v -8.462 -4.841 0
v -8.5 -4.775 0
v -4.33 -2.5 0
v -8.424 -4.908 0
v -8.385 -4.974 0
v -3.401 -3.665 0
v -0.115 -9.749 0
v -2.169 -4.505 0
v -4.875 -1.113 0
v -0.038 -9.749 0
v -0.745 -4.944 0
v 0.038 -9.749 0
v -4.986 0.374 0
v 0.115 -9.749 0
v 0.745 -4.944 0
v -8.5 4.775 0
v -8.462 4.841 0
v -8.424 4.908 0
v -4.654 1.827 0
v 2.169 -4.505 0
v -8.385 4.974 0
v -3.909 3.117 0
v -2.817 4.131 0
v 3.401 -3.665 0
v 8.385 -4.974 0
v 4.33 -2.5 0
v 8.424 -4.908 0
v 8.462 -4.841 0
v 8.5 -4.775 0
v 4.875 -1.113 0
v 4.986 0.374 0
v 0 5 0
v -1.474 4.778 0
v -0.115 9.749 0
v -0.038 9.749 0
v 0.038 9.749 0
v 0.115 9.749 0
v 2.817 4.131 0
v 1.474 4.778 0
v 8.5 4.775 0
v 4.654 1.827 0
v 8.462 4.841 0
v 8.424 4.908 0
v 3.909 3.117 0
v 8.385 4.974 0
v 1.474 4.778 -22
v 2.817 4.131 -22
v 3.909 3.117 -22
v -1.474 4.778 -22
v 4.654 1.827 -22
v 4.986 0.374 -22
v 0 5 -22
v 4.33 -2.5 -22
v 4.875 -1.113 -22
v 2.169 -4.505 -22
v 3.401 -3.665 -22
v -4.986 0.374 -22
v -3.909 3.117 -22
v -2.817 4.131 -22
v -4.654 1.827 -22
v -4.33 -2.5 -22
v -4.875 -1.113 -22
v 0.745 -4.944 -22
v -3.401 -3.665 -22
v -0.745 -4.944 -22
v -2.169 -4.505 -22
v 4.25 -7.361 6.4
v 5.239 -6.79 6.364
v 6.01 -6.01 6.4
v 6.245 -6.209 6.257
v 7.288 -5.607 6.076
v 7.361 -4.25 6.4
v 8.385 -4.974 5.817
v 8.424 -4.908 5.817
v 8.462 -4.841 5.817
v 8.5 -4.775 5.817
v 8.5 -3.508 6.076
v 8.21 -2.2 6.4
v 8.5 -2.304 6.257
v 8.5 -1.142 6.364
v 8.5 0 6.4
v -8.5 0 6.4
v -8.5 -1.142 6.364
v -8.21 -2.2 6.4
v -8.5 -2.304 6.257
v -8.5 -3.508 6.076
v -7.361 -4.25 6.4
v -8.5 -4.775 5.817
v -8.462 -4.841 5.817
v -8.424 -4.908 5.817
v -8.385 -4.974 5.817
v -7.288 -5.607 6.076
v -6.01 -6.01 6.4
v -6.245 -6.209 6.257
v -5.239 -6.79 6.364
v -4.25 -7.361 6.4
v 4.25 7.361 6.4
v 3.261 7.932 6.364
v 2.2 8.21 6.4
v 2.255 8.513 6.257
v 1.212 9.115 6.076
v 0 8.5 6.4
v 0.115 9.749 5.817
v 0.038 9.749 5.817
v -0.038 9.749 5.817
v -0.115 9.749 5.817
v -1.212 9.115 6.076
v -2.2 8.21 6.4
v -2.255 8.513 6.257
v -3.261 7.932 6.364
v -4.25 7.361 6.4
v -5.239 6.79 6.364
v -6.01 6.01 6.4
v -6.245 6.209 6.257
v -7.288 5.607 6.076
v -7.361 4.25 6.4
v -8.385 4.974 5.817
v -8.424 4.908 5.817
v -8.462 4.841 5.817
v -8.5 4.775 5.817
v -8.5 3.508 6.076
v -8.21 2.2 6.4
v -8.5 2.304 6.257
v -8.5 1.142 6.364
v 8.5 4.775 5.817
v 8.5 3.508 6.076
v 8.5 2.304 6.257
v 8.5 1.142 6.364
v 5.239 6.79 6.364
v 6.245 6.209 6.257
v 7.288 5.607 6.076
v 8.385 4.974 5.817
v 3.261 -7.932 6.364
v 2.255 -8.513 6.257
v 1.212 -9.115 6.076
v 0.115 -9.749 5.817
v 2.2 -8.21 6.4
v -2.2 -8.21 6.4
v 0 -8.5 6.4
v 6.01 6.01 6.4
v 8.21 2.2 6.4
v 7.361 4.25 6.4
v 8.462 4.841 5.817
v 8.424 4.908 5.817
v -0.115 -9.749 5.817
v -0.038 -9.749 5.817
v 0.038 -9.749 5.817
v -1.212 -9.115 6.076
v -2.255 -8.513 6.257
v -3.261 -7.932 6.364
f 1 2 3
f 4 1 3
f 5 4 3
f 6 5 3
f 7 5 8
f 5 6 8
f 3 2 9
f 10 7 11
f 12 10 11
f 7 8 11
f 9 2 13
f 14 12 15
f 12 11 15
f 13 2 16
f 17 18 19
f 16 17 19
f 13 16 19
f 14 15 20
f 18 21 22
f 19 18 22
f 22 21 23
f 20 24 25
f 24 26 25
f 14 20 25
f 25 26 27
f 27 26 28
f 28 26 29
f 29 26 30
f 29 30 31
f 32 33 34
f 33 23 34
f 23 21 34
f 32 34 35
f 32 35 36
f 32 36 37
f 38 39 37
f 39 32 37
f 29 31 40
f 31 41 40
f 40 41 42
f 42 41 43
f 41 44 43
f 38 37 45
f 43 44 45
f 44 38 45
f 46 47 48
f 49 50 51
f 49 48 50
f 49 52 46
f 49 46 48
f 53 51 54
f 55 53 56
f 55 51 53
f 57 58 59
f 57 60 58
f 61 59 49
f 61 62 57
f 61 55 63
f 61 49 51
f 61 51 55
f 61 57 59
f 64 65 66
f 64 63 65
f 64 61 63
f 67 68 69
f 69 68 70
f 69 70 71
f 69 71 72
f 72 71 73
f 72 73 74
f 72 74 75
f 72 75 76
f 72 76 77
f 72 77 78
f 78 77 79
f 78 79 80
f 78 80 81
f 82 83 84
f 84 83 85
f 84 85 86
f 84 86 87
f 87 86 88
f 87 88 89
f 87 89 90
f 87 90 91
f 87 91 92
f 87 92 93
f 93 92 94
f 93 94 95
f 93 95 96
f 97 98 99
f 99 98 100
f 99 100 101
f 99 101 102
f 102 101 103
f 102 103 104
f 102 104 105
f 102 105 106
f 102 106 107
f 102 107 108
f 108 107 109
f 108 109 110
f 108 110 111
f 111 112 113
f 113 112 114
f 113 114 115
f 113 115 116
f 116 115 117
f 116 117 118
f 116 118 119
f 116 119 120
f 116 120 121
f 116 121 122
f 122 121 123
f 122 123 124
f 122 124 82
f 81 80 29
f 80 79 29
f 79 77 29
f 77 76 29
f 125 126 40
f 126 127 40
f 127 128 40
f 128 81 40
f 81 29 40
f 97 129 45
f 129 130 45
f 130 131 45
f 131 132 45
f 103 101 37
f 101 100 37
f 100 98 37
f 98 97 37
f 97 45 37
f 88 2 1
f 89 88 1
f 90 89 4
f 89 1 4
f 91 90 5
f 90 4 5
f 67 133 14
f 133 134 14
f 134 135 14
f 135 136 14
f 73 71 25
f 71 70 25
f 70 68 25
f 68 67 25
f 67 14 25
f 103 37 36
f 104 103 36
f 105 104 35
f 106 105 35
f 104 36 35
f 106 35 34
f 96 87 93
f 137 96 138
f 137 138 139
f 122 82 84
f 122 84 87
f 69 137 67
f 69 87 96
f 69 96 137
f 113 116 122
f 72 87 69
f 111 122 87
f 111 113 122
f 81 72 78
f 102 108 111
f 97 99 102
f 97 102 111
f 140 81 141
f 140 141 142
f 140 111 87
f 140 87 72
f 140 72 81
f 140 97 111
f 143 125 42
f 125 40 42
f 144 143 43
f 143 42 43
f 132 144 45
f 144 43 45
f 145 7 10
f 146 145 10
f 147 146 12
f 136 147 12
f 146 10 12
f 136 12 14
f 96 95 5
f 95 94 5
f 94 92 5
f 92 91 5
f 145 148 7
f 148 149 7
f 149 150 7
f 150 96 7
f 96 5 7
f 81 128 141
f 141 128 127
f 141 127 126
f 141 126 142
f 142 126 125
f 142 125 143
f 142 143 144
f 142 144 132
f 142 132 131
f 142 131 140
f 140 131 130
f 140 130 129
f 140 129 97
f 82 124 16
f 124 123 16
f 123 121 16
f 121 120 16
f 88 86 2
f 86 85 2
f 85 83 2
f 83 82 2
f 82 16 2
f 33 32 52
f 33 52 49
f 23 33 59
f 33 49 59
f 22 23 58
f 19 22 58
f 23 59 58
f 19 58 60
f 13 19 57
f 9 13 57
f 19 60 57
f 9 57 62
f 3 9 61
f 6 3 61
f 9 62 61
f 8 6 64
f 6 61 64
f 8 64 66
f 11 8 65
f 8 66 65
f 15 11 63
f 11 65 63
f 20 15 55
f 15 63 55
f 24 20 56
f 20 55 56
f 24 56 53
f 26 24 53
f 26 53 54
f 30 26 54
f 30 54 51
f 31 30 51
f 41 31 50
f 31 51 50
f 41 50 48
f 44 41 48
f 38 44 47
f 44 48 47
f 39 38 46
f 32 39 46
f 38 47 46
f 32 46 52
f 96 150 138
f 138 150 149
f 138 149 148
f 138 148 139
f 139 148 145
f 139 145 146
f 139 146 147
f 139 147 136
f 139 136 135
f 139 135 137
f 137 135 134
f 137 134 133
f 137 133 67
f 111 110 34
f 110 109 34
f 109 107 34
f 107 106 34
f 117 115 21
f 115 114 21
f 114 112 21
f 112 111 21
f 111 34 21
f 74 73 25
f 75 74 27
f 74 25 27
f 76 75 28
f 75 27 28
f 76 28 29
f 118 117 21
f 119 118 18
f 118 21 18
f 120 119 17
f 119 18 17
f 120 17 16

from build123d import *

# Parameters (mm, degrees)
SKETCH1_W      = 22
SKETCH1_H      = 5
EXTRUDE1_DEPTH = 6.4


with BuildPart() as part:
    # Sketch1 → Revolve1 (revolve)
    with BuildSketch(Plane(origin=(0, 0, 0), x_dir=(0, 0, -1), z_dir=(1, 0, 0))):
        with Locations((11, 2.5)):
            Rectangle(SKETCH1_W, SKETCH1_H)
    revolve(axis=Axis((0, 0, 0), (0, 0, 1)))

    # Sketch4 → Extrude1 (add)
    with BuildSketch(Plane.XY):
        Polygon((0, 9.814954576), (-8.5, 4.907477288), (-8.5, -4.907477288), (0, -9.814954576), (8.5, -4.907477288), (8.5, 4.907477288), align=None)
    extrude(amount=EXTRUDE1_DEPTH)

    # Sketch5 → Cut-Revolve3 (revolve, cut)
    with BuildSketch(Plane(origin=(0, 0, 0), x_dir=(0, 0, -1), z_dir=(1, 0, 0))):
        Polygon((-6.4, 8.5), (-5.81748528, 9.749206847), (0, 9.749206847), (0, 9.814954576), (-6.4, 9.814954576), align=None)
    revolve(axis=Axis((0, 0, 0), (0, 0, 1)), mode=Mode.SUBTRACT)


solid = part.part
